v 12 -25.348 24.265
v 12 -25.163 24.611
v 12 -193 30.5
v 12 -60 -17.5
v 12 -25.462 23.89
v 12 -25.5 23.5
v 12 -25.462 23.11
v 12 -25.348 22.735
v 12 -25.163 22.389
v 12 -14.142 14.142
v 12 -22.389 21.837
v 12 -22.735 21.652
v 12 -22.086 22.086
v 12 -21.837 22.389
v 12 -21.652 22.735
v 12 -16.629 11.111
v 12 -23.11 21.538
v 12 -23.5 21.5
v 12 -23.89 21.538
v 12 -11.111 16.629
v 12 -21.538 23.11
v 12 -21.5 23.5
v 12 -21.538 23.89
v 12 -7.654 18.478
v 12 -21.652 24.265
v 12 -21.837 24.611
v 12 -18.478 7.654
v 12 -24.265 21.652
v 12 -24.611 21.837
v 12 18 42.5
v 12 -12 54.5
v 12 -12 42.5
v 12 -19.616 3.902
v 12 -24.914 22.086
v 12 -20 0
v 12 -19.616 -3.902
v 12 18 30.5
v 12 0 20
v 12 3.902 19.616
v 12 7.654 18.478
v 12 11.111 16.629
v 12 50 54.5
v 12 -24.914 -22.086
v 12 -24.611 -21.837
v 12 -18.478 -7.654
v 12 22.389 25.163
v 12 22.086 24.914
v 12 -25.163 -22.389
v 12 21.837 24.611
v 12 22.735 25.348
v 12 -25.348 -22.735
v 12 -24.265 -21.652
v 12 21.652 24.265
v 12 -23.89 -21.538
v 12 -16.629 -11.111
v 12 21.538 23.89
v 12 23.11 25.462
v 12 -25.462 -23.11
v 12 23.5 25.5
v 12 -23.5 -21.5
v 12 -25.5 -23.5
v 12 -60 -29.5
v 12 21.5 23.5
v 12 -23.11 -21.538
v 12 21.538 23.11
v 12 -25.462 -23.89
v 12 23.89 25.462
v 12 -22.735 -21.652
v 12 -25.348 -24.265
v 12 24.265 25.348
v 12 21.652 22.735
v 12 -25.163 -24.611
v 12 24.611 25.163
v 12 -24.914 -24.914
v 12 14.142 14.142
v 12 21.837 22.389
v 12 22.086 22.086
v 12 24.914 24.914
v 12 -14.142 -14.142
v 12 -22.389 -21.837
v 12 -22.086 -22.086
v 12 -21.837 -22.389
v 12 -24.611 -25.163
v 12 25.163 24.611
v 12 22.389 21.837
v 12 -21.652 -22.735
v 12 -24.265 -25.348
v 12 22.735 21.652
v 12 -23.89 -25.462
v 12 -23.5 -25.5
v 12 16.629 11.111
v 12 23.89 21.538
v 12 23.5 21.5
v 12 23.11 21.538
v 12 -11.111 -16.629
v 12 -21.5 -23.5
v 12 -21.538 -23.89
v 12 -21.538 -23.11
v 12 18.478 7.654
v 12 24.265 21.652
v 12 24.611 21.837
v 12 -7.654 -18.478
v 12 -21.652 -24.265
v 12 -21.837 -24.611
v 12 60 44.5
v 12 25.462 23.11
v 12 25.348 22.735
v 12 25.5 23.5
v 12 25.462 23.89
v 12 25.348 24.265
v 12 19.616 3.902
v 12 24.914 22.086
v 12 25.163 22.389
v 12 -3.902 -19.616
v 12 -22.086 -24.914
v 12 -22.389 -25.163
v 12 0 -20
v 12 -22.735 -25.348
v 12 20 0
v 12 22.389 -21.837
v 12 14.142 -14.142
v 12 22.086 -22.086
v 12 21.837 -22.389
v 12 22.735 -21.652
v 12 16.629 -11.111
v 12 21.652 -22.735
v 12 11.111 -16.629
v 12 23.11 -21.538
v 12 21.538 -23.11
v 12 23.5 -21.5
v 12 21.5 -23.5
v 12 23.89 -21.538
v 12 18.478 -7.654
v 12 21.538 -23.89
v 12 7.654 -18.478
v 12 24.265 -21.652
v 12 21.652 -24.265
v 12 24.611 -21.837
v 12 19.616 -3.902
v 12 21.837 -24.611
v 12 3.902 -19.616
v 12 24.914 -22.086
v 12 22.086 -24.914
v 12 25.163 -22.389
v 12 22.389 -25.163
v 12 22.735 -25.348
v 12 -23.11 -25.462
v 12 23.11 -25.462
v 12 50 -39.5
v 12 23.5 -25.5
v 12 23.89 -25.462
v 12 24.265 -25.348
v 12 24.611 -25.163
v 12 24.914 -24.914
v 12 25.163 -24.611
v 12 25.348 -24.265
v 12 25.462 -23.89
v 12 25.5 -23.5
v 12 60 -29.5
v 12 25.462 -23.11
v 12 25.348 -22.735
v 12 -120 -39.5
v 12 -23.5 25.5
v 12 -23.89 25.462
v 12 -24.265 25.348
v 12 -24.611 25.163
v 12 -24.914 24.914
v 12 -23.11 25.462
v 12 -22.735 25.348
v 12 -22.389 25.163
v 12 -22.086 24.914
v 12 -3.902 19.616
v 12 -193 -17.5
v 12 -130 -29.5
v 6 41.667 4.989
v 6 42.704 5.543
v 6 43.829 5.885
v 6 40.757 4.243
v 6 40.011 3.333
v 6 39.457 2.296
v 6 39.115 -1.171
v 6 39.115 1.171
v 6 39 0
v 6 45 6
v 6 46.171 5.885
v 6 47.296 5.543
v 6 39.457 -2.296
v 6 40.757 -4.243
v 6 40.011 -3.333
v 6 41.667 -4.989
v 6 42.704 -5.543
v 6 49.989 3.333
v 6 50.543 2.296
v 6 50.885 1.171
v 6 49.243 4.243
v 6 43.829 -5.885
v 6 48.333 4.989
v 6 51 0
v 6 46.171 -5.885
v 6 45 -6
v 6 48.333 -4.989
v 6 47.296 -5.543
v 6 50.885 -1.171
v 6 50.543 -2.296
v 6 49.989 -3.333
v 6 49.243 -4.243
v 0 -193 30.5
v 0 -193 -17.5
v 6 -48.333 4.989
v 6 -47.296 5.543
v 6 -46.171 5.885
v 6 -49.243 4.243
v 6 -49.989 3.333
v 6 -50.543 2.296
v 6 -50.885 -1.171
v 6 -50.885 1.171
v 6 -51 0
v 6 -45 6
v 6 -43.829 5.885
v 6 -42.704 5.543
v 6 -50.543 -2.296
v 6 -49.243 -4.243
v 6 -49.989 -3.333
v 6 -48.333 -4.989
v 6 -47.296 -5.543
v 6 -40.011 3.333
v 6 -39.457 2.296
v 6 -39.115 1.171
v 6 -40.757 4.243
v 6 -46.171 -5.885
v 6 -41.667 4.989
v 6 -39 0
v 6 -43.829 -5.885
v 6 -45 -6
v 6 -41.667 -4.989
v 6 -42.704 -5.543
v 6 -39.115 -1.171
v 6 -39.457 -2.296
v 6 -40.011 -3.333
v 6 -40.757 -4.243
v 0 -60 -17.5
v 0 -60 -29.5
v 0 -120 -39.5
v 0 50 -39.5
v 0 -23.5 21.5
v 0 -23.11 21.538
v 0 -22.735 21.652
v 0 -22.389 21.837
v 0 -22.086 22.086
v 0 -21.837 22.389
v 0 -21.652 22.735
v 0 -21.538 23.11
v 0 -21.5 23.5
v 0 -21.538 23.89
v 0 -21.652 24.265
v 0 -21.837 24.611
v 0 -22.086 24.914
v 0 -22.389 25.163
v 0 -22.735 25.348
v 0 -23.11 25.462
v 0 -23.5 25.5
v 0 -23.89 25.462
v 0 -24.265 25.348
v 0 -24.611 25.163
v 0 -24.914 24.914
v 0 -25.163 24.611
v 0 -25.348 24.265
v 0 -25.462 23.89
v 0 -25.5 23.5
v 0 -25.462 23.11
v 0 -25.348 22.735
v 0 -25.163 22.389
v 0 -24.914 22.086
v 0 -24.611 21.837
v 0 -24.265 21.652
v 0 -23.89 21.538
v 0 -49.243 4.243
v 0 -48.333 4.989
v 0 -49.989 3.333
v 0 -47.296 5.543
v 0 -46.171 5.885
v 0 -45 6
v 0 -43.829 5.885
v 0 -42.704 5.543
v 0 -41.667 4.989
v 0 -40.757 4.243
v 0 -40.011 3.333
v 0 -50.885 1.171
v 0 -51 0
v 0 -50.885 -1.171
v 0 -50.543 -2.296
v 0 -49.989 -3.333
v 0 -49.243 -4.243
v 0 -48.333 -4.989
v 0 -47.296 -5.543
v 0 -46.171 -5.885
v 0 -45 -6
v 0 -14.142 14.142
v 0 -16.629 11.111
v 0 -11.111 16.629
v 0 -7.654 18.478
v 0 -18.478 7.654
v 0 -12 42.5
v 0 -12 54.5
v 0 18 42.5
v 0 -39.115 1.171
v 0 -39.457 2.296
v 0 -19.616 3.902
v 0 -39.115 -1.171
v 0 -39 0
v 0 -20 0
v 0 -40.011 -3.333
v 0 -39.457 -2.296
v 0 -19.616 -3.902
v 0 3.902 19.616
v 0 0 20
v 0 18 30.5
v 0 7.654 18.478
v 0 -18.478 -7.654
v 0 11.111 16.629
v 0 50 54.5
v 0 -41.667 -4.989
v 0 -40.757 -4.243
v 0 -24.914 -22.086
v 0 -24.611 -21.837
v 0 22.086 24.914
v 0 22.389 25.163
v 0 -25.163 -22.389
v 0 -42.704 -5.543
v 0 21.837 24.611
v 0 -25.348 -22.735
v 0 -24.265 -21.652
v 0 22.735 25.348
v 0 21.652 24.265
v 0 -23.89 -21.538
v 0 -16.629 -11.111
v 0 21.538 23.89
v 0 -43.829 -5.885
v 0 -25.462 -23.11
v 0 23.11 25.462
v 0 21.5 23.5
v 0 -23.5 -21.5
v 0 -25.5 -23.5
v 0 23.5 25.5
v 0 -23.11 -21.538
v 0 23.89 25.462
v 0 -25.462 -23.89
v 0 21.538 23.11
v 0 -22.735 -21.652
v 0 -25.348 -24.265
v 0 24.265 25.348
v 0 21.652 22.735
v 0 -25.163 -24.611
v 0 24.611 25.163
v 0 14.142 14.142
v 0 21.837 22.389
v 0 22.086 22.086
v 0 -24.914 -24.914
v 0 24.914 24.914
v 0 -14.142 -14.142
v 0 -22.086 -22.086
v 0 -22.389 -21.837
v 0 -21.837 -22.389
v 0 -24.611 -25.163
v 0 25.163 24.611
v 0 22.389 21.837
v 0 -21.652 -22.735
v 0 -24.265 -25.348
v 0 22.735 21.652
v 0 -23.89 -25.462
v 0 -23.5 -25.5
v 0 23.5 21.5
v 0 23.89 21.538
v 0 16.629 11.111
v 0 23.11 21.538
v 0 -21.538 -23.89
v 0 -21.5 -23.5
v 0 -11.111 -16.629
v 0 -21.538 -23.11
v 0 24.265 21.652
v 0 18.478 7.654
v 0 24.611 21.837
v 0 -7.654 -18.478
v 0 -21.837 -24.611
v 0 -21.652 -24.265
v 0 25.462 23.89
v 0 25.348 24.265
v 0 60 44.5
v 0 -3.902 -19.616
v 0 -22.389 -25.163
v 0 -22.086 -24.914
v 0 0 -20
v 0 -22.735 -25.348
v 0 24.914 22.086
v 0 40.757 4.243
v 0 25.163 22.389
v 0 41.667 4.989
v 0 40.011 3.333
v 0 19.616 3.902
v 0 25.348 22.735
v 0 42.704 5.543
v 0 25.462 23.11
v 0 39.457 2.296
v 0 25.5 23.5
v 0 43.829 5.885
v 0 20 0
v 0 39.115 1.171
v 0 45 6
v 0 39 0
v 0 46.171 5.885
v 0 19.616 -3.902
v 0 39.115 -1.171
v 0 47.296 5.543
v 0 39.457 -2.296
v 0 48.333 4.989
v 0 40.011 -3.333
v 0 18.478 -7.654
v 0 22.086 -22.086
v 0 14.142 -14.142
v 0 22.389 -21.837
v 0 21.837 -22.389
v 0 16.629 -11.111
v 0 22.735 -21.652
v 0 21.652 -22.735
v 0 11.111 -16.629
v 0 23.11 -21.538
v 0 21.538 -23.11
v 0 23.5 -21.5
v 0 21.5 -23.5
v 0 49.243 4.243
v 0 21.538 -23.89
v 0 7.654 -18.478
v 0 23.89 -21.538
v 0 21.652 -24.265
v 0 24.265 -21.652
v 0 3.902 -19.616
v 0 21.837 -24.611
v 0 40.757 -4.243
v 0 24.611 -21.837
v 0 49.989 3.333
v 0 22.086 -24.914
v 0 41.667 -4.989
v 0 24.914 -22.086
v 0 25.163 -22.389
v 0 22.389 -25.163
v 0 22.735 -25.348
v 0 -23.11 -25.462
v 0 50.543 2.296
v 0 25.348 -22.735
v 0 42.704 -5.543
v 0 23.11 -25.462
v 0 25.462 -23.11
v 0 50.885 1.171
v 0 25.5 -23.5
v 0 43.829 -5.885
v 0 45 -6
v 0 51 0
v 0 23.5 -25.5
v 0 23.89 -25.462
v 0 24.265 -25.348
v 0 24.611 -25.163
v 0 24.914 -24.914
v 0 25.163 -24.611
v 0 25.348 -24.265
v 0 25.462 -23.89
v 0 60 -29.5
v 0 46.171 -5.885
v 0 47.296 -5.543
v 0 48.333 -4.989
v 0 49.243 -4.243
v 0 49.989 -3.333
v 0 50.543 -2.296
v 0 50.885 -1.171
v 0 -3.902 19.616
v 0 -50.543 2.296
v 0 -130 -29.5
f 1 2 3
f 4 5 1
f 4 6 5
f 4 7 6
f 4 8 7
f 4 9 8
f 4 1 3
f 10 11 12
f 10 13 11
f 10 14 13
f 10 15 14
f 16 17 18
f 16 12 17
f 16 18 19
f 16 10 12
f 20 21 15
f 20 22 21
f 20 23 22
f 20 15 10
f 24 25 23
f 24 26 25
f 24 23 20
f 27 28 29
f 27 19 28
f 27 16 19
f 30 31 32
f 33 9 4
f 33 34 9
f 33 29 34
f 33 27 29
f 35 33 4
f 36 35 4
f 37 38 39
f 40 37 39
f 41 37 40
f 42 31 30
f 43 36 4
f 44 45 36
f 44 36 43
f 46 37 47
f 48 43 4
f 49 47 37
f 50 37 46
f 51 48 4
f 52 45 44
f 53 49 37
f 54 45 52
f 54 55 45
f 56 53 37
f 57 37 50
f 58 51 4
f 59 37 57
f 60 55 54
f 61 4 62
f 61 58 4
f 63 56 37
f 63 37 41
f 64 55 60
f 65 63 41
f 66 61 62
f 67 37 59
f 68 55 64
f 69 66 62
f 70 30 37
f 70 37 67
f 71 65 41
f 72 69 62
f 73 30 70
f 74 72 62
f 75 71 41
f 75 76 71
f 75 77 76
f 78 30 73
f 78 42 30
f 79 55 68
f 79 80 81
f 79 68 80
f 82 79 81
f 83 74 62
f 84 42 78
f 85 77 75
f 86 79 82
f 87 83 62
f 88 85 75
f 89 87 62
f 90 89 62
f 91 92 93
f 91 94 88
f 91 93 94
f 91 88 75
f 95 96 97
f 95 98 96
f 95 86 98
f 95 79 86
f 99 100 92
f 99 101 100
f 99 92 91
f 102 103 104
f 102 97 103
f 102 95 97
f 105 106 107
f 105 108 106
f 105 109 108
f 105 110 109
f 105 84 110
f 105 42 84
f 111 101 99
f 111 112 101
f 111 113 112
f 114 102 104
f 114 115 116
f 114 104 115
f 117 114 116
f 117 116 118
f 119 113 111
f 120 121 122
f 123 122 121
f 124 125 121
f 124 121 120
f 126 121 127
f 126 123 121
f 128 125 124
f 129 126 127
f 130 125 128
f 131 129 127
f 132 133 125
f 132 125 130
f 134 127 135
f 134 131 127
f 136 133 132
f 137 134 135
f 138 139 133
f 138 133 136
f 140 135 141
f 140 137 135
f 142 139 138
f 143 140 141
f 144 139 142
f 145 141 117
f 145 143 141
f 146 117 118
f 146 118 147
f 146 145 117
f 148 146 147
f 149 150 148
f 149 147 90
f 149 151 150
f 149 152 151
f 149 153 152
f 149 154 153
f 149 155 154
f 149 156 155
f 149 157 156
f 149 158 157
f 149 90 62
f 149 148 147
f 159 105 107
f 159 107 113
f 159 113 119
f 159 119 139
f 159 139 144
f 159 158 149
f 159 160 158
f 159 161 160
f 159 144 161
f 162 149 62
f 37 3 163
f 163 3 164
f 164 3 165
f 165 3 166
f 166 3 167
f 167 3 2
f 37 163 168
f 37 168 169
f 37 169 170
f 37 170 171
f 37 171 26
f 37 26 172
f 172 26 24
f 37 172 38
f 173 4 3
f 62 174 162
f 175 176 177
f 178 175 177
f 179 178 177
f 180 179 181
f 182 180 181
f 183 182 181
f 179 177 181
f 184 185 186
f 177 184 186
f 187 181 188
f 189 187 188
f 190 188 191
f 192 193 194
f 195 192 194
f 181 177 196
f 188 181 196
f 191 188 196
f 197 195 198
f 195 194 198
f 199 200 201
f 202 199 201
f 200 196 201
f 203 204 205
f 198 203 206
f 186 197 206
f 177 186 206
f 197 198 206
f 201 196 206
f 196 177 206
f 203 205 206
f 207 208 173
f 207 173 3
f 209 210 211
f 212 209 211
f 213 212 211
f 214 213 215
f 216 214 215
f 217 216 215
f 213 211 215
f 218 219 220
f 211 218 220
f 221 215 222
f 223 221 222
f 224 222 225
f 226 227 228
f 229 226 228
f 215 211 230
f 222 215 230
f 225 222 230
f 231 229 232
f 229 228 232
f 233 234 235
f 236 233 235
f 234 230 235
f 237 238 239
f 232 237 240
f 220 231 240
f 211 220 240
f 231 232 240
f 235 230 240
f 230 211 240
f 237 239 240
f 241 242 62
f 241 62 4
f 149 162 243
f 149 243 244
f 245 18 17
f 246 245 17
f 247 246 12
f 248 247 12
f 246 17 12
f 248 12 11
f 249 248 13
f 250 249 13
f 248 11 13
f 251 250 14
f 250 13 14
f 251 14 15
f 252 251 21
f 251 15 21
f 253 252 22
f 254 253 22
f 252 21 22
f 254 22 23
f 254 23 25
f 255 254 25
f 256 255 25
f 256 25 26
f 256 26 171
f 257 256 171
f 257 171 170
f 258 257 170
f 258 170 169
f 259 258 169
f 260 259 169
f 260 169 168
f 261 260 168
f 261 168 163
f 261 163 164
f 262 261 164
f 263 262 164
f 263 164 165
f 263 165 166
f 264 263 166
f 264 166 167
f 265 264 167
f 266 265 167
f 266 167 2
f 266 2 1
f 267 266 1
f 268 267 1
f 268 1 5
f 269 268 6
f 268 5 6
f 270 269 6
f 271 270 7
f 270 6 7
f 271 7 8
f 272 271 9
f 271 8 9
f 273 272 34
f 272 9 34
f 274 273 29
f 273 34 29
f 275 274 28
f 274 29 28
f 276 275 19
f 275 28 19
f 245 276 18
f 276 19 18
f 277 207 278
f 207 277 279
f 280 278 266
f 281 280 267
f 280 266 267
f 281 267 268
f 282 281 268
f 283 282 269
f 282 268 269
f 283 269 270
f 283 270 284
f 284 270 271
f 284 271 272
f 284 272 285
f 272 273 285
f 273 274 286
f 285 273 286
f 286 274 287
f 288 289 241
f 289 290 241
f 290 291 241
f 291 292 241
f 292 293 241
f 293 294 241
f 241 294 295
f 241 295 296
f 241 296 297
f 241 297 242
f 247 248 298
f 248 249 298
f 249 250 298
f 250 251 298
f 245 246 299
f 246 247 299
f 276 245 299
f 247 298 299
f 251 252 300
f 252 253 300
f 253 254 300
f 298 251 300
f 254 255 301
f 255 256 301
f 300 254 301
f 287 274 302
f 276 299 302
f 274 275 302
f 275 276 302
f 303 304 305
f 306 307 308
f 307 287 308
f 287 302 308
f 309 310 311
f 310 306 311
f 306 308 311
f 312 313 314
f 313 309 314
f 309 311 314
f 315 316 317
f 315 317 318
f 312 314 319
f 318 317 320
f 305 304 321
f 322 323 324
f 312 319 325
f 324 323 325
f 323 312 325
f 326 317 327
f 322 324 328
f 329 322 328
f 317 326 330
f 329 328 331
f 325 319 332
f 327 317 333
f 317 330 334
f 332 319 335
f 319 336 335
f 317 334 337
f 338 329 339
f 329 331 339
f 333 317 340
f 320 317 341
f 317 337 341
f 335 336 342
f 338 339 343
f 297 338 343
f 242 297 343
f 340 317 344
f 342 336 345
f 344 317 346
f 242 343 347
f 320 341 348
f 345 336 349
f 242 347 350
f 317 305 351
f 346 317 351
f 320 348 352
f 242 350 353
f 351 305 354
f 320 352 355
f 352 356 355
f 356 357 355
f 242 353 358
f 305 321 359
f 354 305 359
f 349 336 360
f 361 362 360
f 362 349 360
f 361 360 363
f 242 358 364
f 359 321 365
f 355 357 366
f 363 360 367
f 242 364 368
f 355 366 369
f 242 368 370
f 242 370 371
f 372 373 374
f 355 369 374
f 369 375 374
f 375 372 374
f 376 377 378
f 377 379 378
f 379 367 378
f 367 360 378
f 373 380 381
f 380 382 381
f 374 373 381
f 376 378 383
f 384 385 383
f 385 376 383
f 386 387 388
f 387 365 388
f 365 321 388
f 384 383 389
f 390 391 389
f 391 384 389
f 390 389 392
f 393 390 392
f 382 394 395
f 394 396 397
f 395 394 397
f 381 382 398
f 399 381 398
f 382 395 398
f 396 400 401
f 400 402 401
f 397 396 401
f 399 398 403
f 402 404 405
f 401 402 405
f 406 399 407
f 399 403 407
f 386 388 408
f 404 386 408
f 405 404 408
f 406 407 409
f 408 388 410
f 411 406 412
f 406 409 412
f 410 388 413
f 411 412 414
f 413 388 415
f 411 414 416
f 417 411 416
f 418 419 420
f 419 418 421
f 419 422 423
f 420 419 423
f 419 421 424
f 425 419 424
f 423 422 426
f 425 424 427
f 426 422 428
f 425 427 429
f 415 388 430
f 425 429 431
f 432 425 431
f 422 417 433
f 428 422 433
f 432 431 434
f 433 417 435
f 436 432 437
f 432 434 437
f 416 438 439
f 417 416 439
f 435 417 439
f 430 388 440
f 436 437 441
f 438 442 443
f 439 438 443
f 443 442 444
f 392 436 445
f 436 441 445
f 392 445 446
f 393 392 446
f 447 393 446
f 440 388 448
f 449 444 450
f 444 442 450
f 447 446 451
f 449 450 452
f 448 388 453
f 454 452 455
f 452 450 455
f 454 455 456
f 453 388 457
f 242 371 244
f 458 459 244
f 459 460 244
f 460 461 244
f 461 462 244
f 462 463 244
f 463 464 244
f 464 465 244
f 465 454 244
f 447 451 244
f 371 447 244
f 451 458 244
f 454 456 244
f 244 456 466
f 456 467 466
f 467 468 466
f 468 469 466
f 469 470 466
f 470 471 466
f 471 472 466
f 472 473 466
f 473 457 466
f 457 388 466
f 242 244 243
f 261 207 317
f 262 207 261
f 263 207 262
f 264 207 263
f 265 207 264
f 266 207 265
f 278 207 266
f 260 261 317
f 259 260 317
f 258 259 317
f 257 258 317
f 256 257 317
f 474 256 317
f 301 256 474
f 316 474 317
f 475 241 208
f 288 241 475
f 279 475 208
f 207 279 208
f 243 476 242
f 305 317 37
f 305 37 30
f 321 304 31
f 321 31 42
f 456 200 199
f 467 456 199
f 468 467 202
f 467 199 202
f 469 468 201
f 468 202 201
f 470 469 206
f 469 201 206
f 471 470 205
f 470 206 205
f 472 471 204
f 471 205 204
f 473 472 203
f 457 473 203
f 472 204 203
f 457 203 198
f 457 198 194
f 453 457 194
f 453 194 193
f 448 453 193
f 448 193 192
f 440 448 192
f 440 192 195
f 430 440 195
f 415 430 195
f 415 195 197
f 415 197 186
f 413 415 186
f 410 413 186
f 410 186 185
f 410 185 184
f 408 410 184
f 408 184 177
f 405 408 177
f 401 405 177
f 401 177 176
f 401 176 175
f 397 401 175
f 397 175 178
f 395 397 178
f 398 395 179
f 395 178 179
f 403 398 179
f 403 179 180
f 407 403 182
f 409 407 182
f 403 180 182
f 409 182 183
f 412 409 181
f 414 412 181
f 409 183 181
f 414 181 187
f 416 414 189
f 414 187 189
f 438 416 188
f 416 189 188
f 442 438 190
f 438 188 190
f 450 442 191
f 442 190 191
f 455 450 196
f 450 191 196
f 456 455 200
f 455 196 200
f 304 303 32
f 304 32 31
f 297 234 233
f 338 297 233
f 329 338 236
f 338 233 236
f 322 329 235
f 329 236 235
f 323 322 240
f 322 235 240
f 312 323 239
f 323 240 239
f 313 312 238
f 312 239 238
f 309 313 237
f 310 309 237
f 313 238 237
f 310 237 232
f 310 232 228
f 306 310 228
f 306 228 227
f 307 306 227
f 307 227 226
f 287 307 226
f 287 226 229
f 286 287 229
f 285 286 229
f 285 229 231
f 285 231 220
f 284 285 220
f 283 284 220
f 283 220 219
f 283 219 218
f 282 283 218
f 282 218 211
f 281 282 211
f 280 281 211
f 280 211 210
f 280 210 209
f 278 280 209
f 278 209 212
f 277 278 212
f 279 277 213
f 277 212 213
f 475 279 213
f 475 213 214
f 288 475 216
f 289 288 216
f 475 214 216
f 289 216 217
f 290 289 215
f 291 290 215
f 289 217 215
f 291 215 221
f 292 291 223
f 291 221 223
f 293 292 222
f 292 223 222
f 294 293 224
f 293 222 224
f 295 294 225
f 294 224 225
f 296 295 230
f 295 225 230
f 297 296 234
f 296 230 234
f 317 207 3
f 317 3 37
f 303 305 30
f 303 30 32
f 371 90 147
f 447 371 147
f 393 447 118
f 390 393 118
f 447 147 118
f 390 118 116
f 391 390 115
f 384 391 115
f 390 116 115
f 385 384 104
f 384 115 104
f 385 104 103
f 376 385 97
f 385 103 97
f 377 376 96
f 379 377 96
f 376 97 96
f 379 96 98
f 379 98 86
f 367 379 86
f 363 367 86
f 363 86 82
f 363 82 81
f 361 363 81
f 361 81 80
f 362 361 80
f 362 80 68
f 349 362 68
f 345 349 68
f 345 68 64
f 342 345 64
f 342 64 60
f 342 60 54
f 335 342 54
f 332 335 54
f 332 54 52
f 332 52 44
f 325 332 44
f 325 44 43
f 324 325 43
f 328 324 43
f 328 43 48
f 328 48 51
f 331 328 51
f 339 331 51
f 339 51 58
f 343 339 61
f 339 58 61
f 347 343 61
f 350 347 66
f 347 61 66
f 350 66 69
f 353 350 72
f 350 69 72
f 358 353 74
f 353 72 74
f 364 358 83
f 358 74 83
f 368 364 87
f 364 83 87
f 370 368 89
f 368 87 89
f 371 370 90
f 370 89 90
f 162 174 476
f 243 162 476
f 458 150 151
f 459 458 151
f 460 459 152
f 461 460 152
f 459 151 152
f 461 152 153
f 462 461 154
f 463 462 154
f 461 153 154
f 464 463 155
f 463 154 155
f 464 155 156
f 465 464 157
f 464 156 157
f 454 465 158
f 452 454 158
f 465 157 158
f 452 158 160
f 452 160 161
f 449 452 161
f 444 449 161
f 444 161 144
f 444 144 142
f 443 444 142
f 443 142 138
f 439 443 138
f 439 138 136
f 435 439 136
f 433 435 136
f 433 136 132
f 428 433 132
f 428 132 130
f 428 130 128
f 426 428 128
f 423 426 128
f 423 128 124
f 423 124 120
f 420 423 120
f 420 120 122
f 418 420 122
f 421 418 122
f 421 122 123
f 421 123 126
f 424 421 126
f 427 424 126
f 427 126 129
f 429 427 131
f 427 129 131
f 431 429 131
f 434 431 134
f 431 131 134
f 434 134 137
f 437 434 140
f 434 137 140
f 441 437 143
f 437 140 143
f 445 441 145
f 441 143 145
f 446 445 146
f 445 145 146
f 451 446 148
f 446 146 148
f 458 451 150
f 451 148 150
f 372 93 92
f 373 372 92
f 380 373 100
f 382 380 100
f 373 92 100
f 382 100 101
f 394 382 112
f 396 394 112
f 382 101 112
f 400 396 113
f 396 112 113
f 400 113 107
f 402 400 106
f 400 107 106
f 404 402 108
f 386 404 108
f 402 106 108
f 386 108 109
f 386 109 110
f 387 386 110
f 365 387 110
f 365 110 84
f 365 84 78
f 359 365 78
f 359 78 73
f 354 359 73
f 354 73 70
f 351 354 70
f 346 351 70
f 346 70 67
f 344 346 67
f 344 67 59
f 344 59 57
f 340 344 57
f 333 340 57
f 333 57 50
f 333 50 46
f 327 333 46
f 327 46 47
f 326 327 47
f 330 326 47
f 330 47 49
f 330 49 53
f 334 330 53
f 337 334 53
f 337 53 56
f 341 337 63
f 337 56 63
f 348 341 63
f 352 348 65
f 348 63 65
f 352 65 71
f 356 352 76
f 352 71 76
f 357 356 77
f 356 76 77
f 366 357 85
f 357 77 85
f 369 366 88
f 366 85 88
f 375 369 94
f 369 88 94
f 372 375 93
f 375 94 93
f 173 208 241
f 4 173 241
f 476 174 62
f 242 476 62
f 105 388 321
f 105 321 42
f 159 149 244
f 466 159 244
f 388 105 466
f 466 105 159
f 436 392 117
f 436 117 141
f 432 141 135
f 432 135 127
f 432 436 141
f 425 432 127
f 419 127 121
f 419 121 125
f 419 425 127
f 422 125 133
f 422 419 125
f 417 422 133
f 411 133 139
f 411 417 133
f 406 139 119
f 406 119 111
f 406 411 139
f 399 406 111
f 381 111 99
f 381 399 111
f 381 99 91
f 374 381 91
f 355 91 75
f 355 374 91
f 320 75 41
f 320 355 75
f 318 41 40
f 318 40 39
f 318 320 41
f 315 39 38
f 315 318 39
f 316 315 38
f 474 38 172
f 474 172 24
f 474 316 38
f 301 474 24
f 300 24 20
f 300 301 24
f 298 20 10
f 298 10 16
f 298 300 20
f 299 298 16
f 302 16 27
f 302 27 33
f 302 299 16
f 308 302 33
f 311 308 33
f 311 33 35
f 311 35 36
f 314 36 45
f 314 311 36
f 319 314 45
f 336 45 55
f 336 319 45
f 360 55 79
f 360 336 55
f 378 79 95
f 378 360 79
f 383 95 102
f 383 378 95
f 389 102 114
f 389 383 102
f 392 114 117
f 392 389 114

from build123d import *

# Parameters (mm, degrees)
SKETCH1_W                = 59
SKETCH1_H                = 120
SKETCH1_R                = 20
BOSS_EXTRUDE1_DEPTH      = 12
F_4_0_4_DIAMETER_HOLE1_D = 4
HOLE1_D                  = 12
HOLE1_DEPTH              = 6
BOSS_EXTRUDE2_DEPTH      = 12
SKETCH9_W                = 48
SKETCH9_H                = 133
BOSS_EXTRUDE3_DEPTH      = 12
SKETCH11_W               = 10
SKETCH11_H               = 190
BOSS_EXTRUDE4_DEPTH      = 12
CHAMFER1_SIZE            = 10
CHAMFER2_SIZE            = 10


with BuildPart() as part:
    # Sketch1 → Boss-Extrude1 (new body)
    with BuildSketch(Plane(origin=(0, 0, 0), x_dir=(0, 0, -1), z_dir=(1, 0, 0))):
        Rectangle(SKETCH1_W, SKETCH1_H)
        Circle(SKETCH1_R, mode=Mode.SUBTRACT)
    extrude(amount=BOSS_EXTRUDE1_DEPTH)

    # Ø4.0 (4) Diameter Hole1 (through all)
    with Locations(Plane.ZY):
        with Locations((-23.5, 23.5), (23.5, 23.5), (23.5, -23.5), (-23.5, -23.5)):
            Hole(F_4_0_4_DIAMETER_HOLE1_D / 2)

    # Hole1
    with Locations(Plane.ZY):
        with Locations((0, 45), (0, -45)):
            Hole(HOLE1_D / 2, depth=HOLE1_DEPTH)

    # Sketch8 → Boss-Extrude2 (add)
    with BuildSketch(Plane.ZY):
        Polygon((29.5, 60), (29.5, -60), (30.5, -60), (30.5, 18), (42.5, 18), (42.5, -12), (54.5, -12), (54.5, 60), align=None)
    extrude(amount=-BOSS_EXTRUDE2_DEPTH)

    # Sketch9 → Boss-Extrude3 (add)
    with BuildSketch(Plane.ZY):
        with Locations((6.5, -126.5)):
            Rectangle(SKETCH9_W, SKETCH9_H)
    extrude(amount=-BOSS_EXTRUDE3_DEPTH)

    # Sketch11 → Boss-Extrude4 (add)
    with BuildSketch(Plane(origin=(12, 0, 0), x_dir=(0, 0, -1), z_dir=(1, 0, 0))):
        with Locations((34.5, -35)):
            Rectangle(SKETCH11_W, SKETCH11_H)
    extrude(amount=-BOSS_EXTRUDE4_DEPTH)

    # Chamfer1
    chamfer1_edges = [part.edges().sort_by_distance(p)[0] for p in [
        (6, 60, 54.5),
        (6, 60, -39.5),
    ]]
    chamfer(chamfer1_edges, length=CHAMFER1_SIZE)

    # Chamfer2
    chamfer2_edges = [part.edges().sort_by_distance(p)[0] for p in [
        (6, -130, -39.5),
    ]]
    chamfer(chamfer2_edges, length=CHAMFER2_SIZE - 0.0001)  # a hair under: the kernel refuses the full size


solid = part.part
